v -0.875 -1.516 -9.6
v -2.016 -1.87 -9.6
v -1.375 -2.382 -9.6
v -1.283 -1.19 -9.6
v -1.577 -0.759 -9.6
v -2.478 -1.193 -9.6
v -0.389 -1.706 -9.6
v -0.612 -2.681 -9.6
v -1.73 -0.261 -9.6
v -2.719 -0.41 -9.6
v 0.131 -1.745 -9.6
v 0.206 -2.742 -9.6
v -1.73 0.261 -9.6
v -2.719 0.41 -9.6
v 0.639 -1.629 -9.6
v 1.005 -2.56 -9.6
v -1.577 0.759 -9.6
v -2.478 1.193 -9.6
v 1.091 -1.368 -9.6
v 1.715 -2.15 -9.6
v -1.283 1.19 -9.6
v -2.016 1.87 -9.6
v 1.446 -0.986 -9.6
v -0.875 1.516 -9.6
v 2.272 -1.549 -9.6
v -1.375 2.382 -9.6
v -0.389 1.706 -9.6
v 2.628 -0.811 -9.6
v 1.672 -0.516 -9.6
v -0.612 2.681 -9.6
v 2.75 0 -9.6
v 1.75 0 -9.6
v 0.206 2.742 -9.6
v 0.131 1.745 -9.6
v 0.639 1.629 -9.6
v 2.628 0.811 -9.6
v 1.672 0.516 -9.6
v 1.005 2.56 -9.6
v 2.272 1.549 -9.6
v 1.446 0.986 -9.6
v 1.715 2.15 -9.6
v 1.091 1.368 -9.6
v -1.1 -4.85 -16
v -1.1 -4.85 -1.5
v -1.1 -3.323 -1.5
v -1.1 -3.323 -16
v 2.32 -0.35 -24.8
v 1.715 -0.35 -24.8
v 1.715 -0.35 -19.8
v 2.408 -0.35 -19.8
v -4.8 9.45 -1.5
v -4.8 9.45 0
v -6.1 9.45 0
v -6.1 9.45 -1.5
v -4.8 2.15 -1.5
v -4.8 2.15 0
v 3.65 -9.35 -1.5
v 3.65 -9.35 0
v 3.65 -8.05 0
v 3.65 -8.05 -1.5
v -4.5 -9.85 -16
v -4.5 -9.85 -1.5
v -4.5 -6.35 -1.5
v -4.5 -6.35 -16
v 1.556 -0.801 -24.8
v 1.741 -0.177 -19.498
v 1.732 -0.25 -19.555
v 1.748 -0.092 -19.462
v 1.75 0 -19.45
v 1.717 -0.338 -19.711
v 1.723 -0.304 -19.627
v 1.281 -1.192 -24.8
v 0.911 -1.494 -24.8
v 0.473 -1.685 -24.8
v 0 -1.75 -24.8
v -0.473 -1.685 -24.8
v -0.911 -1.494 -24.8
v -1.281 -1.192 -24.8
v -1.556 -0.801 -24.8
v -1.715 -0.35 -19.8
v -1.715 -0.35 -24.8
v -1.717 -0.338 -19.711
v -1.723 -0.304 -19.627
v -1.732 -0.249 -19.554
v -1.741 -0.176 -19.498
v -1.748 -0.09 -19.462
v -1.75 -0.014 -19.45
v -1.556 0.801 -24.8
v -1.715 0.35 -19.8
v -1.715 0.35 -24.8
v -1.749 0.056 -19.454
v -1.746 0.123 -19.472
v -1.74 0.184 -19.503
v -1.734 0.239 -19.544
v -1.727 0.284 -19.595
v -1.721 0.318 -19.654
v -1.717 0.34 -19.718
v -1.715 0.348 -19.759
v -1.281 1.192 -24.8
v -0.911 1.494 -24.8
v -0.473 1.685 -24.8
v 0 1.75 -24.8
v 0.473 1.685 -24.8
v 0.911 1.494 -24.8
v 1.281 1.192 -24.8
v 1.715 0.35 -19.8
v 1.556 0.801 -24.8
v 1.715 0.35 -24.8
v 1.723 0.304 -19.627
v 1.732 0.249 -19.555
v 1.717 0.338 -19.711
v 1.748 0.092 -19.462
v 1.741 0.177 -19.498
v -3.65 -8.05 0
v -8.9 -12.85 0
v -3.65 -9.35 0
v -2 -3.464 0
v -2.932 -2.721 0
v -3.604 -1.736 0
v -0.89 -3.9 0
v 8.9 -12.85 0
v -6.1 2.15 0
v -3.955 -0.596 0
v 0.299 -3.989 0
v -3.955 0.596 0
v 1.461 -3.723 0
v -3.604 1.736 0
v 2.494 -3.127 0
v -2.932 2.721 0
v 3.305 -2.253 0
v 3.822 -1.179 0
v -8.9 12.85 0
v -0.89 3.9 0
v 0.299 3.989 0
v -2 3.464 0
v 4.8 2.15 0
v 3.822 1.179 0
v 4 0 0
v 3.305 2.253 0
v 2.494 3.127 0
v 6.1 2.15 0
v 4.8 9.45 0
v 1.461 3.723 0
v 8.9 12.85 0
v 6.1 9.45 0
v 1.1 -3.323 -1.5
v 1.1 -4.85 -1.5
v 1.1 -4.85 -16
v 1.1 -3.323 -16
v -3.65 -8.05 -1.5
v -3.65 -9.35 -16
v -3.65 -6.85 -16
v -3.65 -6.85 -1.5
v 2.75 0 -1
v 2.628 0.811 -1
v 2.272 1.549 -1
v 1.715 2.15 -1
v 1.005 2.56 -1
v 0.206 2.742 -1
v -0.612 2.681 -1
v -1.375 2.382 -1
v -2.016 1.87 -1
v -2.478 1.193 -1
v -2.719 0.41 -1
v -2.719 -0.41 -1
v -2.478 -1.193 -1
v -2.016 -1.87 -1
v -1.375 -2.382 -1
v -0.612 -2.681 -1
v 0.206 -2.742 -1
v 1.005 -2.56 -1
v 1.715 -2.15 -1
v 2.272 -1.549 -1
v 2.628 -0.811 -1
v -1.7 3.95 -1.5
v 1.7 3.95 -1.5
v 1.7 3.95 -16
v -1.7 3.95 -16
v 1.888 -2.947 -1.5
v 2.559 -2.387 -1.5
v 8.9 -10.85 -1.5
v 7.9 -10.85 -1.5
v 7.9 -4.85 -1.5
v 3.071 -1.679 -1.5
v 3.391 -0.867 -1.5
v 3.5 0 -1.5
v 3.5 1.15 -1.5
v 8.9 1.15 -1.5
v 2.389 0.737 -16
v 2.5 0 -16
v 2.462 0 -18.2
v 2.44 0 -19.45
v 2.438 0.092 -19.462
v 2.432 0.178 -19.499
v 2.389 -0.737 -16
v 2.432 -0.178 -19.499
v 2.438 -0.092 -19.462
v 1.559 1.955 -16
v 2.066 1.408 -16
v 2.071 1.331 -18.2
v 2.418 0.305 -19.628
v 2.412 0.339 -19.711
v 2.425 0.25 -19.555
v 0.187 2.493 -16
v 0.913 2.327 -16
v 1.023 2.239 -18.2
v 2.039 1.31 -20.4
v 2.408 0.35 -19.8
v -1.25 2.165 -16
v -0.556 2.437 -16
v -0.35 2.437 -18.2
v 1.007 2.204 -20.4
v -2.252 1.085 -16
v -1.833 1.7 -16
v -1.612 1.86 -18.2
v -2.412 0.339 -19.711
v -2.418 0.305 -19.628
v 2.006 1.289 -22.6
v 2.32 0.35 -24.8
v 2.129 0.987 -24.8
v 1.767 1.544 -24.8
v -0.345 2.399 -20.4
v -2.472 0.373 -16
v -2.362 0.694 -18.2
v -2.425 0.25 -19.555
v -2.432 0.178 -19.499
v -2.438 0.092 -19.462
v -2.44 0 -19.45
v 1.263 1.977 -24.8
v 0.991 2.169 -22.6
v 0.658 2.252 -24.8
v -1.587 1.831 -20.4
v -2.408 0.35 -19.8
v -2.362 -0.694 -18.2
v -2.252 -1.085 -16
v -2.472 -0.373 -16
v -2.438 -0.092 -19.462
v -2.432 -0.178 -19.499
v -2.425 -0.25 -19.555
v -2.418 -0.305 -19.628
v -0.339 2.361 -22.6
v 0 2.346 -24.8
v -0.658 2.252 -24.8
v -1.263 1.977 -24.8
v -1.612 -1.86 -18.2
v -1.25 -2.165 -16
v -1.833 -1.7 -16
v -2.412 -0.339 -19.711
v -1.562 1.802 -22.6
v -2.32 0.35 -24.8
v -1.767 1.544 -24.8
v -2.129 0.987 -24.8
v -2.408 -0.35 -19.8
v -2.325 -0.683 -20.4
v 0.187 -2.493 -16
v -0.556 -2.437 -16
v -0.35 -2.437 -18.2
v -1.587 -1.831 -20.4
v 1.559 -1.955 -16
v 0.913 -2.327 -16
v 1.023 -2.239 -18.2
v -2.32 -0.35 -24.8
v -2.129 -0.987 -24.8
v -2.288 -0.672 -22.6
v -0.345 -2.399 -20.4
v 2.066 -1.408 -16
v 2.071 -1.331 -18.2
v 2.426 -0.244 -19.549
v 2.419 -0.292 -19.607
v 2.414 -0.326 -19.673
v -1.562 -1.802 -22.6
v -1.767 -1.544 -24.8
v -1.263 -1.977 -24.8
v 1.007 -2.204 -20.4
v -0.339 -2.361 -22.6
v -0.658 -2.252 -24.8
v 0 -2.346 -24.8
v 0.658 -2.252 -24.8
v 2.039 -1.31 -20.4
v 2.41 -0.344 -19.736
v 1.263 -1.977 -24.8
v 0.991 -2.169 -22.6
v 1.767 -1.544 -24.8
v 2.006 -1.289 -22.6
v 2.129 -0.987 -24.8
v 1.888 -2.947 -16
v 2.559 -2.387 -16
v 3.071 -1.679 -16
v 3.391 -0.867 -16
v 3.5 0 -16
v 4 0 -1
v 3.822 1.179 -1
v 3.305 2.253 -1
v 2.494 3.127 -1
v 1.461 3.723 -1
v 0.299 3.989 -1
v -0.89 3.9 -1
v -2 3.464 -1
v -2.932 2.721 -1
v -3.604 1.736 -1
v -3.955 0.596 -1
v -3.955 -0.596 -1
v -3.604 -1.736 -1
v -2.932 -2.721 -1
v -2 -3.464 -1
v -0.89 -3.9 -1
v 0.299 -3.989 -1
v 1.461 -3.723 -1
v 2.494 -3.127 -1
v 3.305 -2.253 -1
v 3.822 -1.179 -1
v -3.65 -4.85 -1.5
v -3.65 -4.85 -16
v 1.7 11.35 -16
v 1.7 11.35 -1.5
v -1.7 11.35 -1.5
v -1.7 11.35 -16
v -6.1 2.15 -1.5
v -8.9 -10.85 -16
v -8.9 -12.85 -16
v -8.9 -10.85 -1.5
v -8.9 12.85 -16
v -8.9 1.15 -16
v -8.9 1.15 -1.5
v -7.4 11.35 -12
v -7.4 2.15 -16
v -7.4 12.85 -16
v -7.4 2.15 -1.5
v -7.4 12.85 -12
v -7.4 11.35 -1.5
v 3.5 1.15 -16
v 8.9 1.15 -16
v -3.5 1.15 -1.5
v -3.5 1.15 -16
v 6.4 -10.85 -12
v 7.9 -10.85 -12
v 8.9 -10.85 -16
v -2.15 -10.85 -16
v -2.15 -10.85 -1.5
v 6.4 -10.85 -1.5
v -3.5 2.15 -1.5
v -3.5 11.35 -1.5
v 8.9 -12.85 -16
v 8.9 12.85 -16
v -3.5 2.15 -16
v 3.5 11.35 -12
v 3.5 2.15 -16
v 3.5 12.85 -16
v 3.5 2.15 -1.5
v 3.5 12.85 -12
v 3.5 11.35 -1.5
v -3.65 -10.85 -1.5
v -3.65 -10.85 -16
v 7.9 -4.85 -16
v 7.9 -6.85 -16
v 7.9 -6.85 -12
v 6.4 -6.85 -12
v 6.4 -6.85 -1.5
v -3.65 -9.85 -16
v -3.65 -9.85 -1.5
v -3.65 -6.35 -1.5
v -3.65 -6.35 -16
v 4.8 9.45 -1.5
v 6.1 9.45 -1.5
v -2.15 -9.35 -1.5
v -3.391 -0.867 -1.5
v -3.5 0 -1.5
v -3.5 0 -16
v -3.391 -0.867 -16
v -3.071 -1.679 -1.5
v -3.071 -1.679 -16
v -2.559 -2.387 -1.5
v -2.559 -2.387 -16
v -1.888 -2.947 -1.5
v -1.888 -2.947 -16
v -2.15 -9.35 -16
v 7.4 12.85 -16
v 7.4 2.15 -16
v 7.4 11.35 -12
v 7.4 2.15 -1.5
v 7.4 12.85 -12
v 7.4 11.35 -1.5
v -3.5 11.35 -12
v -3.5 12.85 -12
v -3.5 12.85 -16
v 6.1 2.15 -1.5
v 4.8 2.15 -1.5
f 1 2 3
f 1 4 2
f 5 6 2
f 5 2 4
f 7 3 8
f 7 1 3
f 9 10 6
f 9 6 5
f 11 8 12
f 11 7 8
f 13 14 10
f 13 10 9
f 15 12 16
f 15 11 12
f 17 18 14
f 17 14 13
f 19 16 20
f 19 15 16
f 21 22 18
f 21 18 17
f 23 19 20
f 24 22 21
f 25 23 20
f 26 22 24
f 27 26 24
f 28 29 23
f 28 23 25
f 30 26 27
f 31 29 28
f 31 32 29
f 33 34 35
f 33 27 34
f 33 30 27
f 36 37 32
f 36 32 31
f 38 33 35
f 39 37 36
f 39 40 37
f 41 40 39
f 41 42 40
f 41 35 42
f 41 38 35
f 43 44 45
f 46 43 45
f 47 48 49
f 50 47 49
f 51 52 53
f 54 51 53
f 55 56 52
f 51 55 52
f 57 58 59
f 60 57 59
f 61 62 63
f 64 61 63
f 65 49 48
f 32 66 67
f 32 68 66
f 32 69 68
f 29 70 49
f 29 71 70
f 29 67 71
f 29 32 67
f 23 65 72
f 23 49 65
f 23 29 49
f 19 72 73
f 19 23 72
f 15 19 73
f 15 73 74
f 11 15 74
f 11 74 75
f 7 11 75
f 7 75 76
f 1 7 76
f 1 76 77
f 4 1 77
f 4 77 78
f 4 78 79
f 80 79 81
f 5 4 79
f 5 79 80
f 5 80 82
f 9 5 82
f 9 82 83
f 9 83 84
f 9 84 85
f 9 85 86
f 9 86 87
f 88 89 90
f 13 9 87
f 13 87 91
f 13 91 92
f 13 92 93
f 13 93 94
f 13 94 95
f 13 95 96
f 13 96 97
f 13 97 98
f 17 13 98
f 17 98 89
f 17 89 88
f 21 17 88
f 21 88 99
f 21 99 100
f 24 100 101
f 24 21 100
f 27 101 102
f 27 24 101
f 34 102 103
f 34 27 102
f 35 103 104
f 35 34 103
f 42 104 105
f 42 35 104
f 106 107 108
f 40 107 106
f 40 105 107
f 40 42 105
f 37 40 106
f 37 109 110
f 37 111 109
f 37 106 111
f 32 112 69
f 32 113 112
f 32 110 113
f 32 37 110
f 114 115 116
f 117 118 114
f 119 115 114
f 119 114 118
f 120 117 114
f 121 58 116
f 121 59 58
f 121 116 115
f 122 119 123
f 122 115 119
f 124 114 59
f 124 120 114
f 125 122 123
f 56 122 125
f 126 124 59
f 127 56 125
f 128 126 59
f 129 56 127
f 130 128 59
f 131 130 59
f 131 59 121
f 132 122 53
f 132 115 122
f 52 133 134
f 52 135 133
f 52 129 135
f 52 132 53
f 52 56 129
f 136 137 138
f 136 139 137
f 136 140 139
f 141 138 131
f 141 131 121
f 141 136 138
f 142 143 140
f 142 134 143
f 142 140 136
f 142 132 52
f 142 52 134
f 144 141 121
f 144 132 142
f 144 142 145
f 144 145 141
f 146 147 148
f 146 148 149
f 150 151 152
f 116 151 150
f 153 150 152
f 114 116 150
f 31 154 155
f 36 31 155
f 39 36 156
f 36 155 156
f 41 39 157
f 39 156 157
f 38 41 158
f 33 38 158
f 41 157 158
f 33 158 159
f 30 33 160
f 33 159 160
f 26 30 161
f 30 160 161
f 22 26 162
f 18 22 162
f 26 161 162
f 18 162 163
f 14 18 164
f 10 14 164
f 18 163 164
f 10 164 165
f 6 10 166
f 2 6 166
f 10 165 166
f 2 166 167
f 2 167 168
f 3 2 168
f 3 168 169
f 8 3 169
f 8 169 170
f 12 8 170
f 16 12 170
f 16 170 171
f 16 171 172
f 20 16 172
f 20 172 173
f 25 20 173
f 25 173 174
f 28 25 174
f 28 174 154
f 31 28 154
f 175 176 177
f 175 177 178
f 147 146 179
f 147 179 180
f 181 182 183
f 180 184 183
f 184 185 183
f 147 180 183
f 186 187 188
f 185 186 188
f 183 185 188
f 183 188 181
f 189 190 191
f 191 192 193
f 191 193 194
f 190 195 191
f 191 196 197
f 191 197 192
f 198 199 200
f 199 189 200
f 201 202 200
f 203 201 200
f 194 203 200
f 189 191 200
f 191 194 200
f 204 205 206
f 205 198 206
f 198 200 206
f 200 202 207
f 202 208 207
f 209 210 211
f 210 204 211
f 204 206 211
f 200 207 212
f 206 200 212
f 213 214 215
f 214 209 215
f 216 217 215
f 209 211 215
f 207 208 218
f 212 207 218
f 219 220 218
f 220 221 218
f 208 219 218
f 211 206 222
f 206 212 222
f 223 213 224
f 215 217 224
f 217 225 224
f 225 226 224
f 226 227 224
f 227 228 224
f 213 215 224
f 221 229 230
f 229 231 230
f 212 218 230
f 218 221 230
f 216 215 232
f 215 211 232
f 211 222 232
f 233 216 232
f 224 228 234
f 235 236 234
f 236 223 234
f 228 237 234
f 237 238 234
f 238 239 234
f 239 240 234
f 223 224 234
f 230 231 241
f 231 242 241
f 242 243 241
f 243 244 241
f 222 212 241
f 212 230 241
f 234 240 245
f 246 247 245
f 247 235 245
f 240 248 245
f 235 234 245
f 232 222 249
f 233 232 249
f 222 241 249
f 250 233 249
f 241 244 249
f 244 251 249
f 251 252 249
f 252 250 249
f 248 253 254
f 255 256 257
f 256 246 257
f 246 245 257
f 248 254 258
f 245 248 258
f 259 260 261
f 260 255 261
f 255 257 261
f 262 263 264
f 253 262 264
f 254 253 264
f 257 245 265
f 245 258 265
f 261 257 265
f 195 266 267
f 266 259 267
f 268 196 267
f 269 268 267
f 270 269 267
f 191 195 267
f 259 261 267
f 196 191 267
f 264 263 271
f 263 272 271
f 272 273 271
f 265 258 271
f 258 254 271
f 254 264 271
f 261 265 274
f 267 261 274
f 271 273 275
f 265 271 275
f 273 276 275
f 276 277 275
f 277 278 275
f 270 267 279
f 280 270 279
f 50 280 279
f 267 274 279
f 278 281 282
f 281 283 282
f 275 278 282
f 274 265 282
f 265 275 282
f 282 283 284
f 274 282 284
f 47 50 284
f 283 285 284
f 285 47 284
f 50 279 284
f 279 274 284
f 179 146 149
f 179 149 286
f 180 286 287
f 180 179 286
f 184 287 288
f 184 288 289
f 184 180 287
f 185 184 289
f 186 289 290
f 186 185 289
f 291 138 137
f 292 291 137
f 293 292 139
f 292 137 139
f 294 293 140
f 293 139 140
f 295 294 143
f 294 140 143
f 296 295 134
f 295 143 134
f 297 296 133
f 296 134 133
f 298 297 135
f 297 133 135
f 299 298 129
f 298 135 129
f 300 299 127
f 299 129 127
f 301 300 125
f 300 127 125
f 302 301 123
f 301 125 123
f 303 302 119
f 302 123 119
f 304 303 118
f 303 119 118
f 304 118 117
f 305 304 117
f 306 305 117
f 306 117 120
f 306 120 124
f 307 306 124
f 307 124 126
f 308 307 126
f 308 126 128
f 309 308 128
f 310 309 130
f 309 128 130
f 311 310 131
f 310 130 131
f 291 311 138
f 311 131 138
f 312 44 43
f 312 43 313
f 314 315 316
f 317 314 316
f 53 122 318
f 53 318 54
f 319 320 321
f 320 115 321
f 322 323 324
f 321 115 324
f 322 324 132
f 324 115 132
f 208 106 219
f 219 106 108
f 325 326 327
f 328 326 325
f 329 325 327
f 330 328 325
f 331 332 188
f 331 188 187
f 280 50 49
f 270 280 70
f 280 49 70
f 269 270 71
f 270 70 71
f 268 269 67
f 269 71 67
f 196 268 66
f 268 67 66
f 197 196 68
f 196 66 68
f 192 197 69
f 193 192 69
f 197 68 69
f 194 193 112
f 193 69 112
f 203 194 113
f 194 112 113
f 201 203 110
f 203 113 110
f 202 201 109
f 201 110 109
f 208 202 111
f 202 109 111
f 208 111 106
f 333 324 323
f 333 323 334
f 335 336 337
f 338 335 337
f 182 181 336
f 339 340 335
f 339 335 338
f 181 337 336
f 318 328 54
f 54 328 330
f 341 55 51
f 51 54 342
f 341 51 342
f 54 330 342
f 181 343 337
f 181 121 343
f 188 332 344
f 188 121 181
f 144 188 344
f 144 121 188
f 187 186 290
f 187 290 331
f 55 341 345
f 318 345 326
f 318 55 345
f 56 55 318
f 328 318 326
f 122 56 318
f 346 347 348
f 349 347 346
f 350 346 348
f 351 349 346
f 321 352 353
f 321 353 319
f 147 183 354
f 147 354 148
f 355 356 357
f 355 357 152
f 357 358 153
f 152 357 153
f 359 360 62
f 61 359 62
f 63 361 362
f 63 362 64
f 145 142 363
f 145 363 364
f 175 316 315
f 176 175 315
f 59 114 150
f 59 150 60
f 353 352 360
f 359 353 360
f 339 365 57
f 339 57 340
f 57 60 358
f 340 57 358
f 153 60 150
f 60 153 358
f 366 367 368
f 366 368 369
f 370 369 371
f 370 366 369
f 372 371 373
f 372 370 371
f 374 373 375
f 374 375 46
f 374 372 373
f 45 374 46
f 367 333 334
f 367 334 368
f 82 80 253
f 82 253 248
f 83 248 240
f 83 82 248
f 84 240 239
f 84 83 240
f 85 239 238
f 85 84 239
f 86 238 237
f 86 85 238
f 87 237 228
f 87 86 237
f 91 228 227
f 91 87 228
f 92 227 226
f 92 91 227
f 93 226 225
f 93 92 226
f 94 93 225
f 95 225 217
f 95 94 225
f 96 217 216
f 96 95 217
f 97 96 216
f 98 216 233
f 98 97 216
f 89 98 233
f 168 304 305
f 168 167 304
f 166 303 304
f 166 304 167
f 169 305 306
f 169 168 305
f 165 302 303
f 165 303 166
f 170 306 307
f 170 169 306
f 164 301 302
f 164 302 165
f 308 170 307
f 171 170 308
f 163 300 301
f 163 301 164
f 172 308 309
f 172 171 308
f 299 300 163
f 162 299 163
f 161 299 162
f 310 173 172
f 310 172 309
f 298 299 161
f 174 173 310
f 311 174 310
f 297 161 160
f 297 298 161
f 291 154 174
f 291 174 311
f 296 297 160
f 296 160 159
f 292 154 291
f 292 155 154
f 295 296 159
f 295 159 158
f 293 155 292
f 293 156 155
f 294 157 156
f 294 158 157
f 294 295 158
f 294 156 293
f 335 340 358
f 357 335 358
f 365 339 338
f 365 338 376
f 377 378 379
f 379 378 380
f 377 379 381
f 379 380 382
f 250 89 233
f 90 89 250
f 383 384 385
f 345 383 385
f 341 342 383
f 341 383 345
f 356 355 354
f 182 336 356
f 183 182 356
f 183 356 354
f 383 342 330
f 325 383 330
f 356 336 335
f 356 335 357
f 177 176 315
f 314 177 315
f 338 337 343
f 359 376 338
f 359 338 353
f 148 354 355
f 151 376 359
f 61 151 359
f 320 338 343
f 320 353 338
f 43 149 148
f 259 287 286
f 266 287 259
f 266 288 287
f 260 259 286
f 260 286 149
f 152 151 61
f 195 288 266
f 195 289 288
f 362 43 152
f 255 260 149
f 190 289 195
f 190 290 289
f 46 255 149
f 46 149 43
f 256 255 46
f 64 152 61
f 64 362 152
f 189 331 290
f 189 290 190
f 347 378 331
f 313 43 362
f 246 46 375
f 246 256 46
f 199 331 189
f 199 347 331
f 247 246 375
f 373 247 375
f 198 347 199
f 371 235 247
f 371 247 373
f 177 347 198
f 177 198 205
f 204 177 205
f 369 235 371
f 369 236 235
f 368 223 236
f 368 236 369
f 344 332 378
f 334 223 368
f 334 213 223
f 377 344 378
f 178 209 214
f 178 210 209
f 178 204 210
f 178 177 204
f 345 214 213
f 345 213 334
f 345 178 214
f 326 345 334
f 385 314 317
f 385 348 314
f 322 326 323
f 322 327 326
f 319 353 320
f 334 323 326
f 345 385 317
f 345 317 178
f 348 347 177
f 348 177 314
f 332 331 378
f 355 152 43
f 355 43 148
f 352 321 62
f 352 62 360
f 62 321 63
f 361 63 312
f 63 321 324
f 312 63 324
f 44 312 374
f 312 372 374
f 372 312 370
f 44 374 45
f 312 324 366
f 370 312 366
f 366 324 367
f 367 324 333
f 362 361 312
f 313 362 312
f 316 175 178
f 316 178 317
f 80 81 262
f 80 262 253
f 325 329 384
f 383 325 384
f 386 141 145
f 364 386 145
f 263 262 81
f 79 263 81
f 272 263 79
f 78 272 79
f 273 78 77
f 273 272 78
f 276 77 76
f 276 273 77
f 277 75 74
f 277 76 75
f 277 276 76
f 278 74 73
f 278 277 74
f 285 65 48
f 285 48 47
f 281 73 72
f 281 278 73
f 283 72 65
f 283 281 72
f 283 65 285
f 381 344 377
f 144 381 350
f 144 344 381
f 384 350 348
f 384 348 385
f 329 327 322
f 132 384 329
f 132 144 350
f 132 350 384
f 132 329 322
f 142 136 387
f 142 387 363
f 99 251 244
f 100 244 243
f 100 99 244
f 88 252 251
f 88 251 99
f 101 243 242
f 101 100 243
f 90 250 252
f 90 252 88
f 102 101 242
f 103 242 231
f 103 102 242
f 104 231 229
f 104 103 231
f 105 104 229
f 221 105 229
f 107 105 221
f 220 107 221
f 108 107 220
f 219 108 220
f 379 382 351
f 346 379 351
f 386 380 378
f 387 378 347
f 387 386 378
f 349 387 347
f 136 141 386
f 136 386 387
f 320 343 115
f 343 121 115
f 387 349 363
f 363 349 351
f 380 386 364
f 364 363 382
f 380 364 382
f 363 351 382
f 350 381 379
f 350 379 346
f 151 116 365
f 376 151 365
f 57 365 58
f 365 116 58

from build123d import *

# Parameters (mm, degrees)
BASES_W                              = 17.8
BASES_H                              = 25.7
BASE_DEPTH                           = 1.5
NEUTRALS_W                           = 1.3
NEUTRALS_H                           = 7.3
NEUTRAL_DEPTH                        = 1.6
FASTENERACCESSS_R                    = 4
FASTENER_ACCESS_DEPTH                = 1
GROUNDS_W                            = 7.3
GROUNDS_H                            = 1.3
GROUND_DEPTH                         = 1.6
BASETOPS_W                           = 17.8
BASETOPS_H                           = 1.5
BASE_TOP_DEPTH                       = 14.5
BASERIGHTWALLS_W                     = 1.5
BASERIGHTWALLS_H                     = 10.2
BASE_RIGHT_WALL_DEPTH                = 14.5
CONNECTORWALLS_W                     = 1.8
CONNECTORWALLS_H                     = 10.2
CONNECTOR_WALL_DEPTH                 = 14.5
CONNECTOR_LOCATE_REACH               = 33.555
CONNECTORLOCATES_W                   = 3.9
CONNECTORLOCATES_H                   = 4
BASEBOTTOMS_W                        = 17.8
BASEBOTTOMS_H                        = 2
BASE_BOTTOM_DEPTH                    = 14.5
FASTENERACCESSHOLEEXTENDS_R          = 2.75
FASTENER_ACCESS_HOLE_EXTEND_DEPTH    = 22.664083179
FASTENER_HOLDING_BODY_DEPTH          = 14.5
FASTENERHOLDINGTOPBORES_R            = 2.75
FASTENER_HOLDING_TOP_BORE_DEPTH      = 8.1
FASTENERHOLDINGBORES_R               = 1.75
FASTENER_HOLDING_BORE_DEPTH          = 19.343731899
ELECTRICALCONNECTIONBASES_W          = 3.9
ELECTRICALCONNECTIONBASES_H          = 1
ELECTRICAL_CONNECTION_BASE_DEPTH     = 14.5
CONNECTIONS_MIDWALL_JOINT_DEPTH      = 14.5
FASTENERHOLDINGEXTENDEDBODYS_R       = 2.5
FASTENERHOLDINGEXTENDEDBODYS_R_2     = 1.75
FASTENER_HOLDING_EXTENDED_BODY_DEPTH = 8.8
FHEB_SLOT_REACH                      = 31.315
FHEB_SLOT_DIRECTION_2_REACH          = 31.315
MIDWALLENDS_W                        = 2.2
MIDWALLENDS_H                        = 1.527350455
MID_WALL_END_DEPTH                   = 14.5
GROUNDWALLS_W                        = 1.5
GROUNDWALLS_H                        = 6
GROUND_WALL_DEPTH                    = 14.5
GROUNDEXTENDEDWALLSS_W               = 10.05
GROUNDEXTENDEDWALLSS_H               = 2
GROUNDEXTENDEDWALLSS_W_2             = 1.5
GROUNDEXTENDEDWALLSS_H_2             = 1.5
GROUND_EXTENDED_WALLS_DEPTH          = 14.5
GROUNDENDWALLS_W                     = 0.85
GROUNDENDWALLS_H                     = 3.5
GROUND_END_WALL_DEPTH                = 14.5
GROUND_CONNECTOR_LOCATE_REACH        = 34.595
GROUNDCONNECTORLOCATES_W             = 4
GROUNDCONNECTORLOCATES_H             = 4


# Read off the part's stored shape, not the designer's step: FHEB DRAFT
with BuildPart() as part:
    # BaseS → BASE (new body)
    with BuildSketch(Plane.XY):
        Rectangle(BASES_W, BASES_H)
    extrude(amount=-BASE_DEPTH)

    # NeutralS → NEUTRAL (cut)
    with BuildSketch(Plane.XY):
        with Locations((5.45, 5.8)):
            Rectangle(NEUTRALS_W, NEUTRALS_H)
    neutral = extrude(amount=-NEUTRAL_DEPTH, mode=Mode.SUBTRACT)

    # LINE HM: NEUTRAL across plane
    add(neutral.mirror(Plane(origin=(0, 0, 0), x_dir=(0, 0, 1), z_dir=(1, 0, 0))), mode=Mode.SUBTRACT)

    # FastenerAccessS → FASTENER ACCESS (cut)
    with BuildSketch(Plane.XY):
        Circle(FASTENERACCESSS_R)
    extrude(amount=-FASTENER_ACCESS_DEPTH, mode=Mode.SUBTRACT)

    # GroundS → GROUND (cut)
    with BuildSketch(Plane.XY):
        with Locations((0, -8.7)):
            Rectangle(GROUNDS_W, GROUNDS_H)
    extrude(amount=-GROUND_DEPTH, mode=Mode.SUBTRACT)

    # BaseTopS → BASE TOP (add)
    with BuildSketch(Plane(origin=(0, 0, -1.5), x_dir=(-1, 0, 0), z_dir=(0, 0, -1))):
        with Locations((0, 12.1)):
            Rectangle(BASETOPS_W, BASETOPS_H)
    extrude(amount=BASE_TOP_DEPTH)

    # BaseRightWallS → BASE RIGHT WALL (add)
    with BuildSketch(Plane(origin=(0, 0, -1.5), x_dir=(-1, 0, 0), z_dir=(0, 0, -1))):
        with Locations((-8.15, 6.25)):
            Rectangle(BASERIGHTWALLS_W, BASERIGHTWALLS_H)
    base_right_wall = extrude(amount=BASE_RIGHT_WALL_DEPTH)

    # ConnectorWallS → CONNECTOR WALL (add)
    with BuildSketch(Plane(origin=(0, 0, -1.5), x_dir=(-1, 0, 0), z_dir=(0, 0, -1))):
        with Locations((-2.6, 6.25)):
            Rectangle(CONNECTORWALLS_W, CONNECTORWALLS_H)
    connector_wall = extrude(amount=CONNECTOR_WALL_DEPTH)

    # ConnectorLocateS → CONNECTOR LOCATE (cut, up to next)
    with BuildSketch(Plane(origin=(0, 12.85, 0), x_dir=(-1, 0, 0), z_dir=(0, 1, 0)), mode=Mode.PRIVATE) as connector_locate_sk1:
        with Locations((-5.45, -14)):
            Rectangle(CONNECTORLOCATES_W, CONNECTORLOCATES_H)
    connector_locate_tool1 = extrude(connector_locate_sk1.sketch, amount=-CONNECTOR_LOCATE_REACH, mode=Mode.PRIVATE) & part.part
    connector_locate = connector_locate_tool1.solids().sort_by_distance((5.45, 12.85, -14))[0]
    add(connector_locate, mode=Mode.SUBTRACT)

    # CW CL HM: BASE RIGHT WALL, CONNECTOR WALL, CONNECTOR LOCATE across plane
    add(base_right_wall.mirror(Plane(origin=(0, 0, 0), x_dir=(0, 0, 1), z_dir=(1, 0, 0))))
    add(connector_wall.mirror(Plane(origin=(0, 0, 0), x_dir=(0, 0, 1), z_dir=(1, 0, 0))))
    add(connector_locate.mirror(Plane(origin=(0, 0, 0), x_dir=(0, 0, 1), z_dir=(1, 0, 0))), mode=Mode.SUBTRACT)

    # BaseBottomS → BASE BOTTOM (add)
    with BuildSketch(Plane(origin=(0, 0, -1.5), x_dir=(-1, 0, 0), z_dir=(0, 0, -1))):
        with Locations((0, -11.85)):
            Rectangle(BASEBOTTOMS_W, BASEBOTTOMS_H)
    extrude(amount=BASE_BOTTOM_DEPTH)

    # FastenerAccessHoleExtendS → FASTENER ACCESS HOLE EXTEND (cut, through all)
    with BuildSketch(Plane.XY.offset(-1)):
        Circle(FASTENERACCESSHOLEEXTENDS_R)
    extrude(amount=-FASTENER_ACCESS_HOLE_EXTEND_DEPTH, mode=Mode.SUBTRACT)

    # FastenerHoldingBodyS → FASTENER HOLDING BODY (add)
    with BuildSketch(Plane(origin=(0, 0, -1.5), x_dir=(-1, 0, 0), z_dir=(0, 0, -1))):
        with BuildLine():
            Line((-3.5, 0), (-3.5, 1.15))
            Line((-3.5, 1.15), (-3.305676935, 1.15))
            ThreePointArc((-3.305676935, 1.15), (0, 3.5), (3.305676935, 1.15))
            Line((3.305676935, 1.15), (3.5, 1.15))
            Line((3.5, 1.15), (3.5, 0))
            ThreePointArc((3.5, 0), (0, -3.5), (-3.5, 0))
        make_face()
    extrude(amount=FASTENER_HOLDING_BODY_DEPTH)

    # FastenerHoldingTopBoreS → FASTENER HOLDING TOP BORE (cut)
    with BuildSketch(Plane.XY.offset(-1.5)):
        Circle(FASTENERHOLDINGTOPBORES_R)
    extrude(amount=-FASTENER_HOLDING_TOP_BORE_DEPTH, mode=Mode.SUBTRACT)

    # FastenerHoldingBoreS → FASTENER HOLDING BORE (cut, through all)
    with BuildSketch(Plane.XY.offset(-9.6)):
        Circle(FASTENERHOLDINGBORES_R)
    extrude(amount=-FASTENER_HOLDING_BORE_DEPTH, mode=Mode.SUBTRACT)

    # ElectricalConnectionBaseS → ELECTRICAL CONNECTION BASE (add)
    with BuildSketch(Plane(origin=(0, 0, -1.5), x_dir=(-1, 0, 0), z_dir=(0, 0, -1))):
        with Locations((-5.45, 1.65)):
            Rectangle(ELECTRICALCONNECTIONBASES_W, ELECTRICALCONNECTIONBASES_H)
        with Locations((5.45, 1.65)):
            Rectangle(ELECTRICALCONNECTIONBASES_W, ELECTRICALCONNECTIONBASES_H)
    extrude(amount=ELECTRICAL_CONNECTION_BASE_DEPTH)

    # ConnectionsMidwallJointS → CONNECTIONS MIDWALL JOINT (add)
    with BuildSketch(Plane(origin=(0, 0, -1.5), x_dir=(-1, 0, 0), z_dir=(0, 0, -1))):
        with BuildLine():
            Line((-1.7, 3.95), (1.7, 3.95))
            Line((1.7, 3.95), (1.7, 3.059411708))
            ThreePointArc((1.7, 3.059411708), (0, 3.5), (-1.7, 3.059411708))
            Line((-1.7, 3.059411708), (-1.7, 3.95))
        make_face()
    extrude(amount=CONNECTIONS_MIDWALL_JOINT_DEPTH)

    # FastenerHoldingExtendedBodyS → FASTENER HOLDING EXTENDED BODY (add)
    with BuildSketch(Plane(origin=(0, 0, -16), x_dir=(-1, 0, 0), z_dir=(0, 0, -1))):
        with Locations(Location((0, 0, 0), (0, 0, 180))):
            Circle(FASTENERHOLDINGEXTENDEDBODYS_R)
        with Locations(Location((0, 0, 0), (0, 0, 180))):
            Circle(FASTENERHOLDINGEXTENDEDBODYS_R_2, mode=Mode.SUBTRACT)
    extrude(amount=FASTENER_HOLDING_EXTENDED_BODY_DEPTH)

    # FHEBSlotS → FHEB SLOT (cut, up to next)
    with BuildSketch(Plane(origin=(0, 0, 0), x_dir=(0, 0, -1), z_dir=(1, 0, 0)), mode=Mode.PRIVATE) as fheb_slot_sk1:
        with BuildLine():
            Line((24.8, -0.35), (19.8, -0.35))
            ThreePointArc((19.8, -0.35), (19.45, 0), (19.8, 0.35))
            Line((19.8, 0.35), (24.8, 0.35))
            Line((24.8, 0.35), (24.8, -0.35))
        make_face()
    fheb_slot_tool1 = extrude(fheb_slot_sk1.sketch, amount=-FHEB_SLOT_REACH, mode=Mode.PRIVATE) & part.part
    add(fheb_slot_tool1.solids().sort_by_distance((0, 0, -22.161977))[0], mode=Mode.SUBTRACT)

    # FHEBSlotS → FHEB SLOT direction 2 (cut, up to next)
    with BuildSketch(Plane(origin=(0, 0, 0), x_dir=(0, 0, -1), z_dir=(1, 0, 0)), mode=Mode.PRIVATE) as fheb_slot_direction_2_sk1:
        with BuildLine():
            Line((24.8, -0.35), (19.8, -0.35))
            ThreePointArc((19.8, -0.35), (19.45, 0), (19.8, 0.35))
            Line((19.8, 0.35), (24.8, 0.35))
            Line((24.8, 0.35), (24.8, -0.35))
        make_face()
    fheb_slot_direction_2_tool1 = extrude(fheb_slot_direction_2_sk1.sketch, amount=FHEB_SLOT_DIRECTION_2_REACH, mode=Mode.PRIVATE) & part.part
    add(fheb_slot_direction_2_tool1.solids().sort_by_distance((0, 0, -22.161977))[0], mode=Mode.SUBTRACT)

    # MidWallEndS → MID WALL END (add)
    with BuildSketch(Plane(origin=(0, 0, -1.5), x_dir=(-1, 0, 0), z_dir=(0, 0, -1))):
        with Locations((0, -4.086324773)):
            Rectangle(MIDWALLENDS_W, MIDWALLENDS_H)
    extrude(amount=MID_WALL_END_DEPTH)

    # GroundWallS → GROUND WALL (add)
    with BuildSketch(Plane(origin=(0, 0, -1.5), x_dir=(-1, 0, 0), z_dir=(0, 0, -1))):
        with Locations((-7.15, -7.85)):
            Rectangle(GROUNDWALLS_W, GROUNDWALLS_H)
    extrude(amount=GROUND_WALL_DEPTH)

    # GroundExtendedWallsS → GROUND EXTENDED WALLS (add)
    with BuildSketch(Plane(origin=(0, 0, -1.5), x_dir=(-1, 0, 0), z_dir=(0, 0, -1))):
        with Locations((-1.375, -5.85)):
            Rectangle(GROUNDEXTENDEDWALLSS_W, GROUNDEXTENDEDWALLSS_H)
        with Locations((2.9, -10.1)):
            Rectangle(GROUNDEXTENDEDWALLSS_W_2, GROUNDEXTENDEDWALLSS_H_2)
    extrude(amount=GROUND_EXTENDED_WALLS_DEPTH)

    # GroundEndWallS → GROUND END WALL (add)
    with BuildSketch(Plane(origin=(0, 0, -1.5), x_dir=(-1, 0, 0), z_dir=(0, 0, -1))):
        with Locations((4.075, -8.1)):
            Rectangle(GROUNDENDWALLS_W, GROUNDENDWALLS_H)
    extrude(amount=GROUND_END_WALL_DEPTH)

    # FHEB DRAFT outline → FHEB DRAFT (revolve, cut)
    with BuildSketch(Plane.XZ):
        Polygon((2.5, -16), (2.346395429, -24.8), (2.5, -24.8), align=None)
    revolve(axis=Axis((0, 0, 0), (0, 0, 1)), mode=Mode.SUBTRACT)

    # GroundConnectorLocateS → GROUND CONNECTOR LOCATE (cut, up to next)
    with BuildSketch(Plane(origin=(7.9, 0, 0), x_dir=(0, 0, -1), z_dir=(1, 0, 0)), mode=Mode.PRIVATE) as ground_connector_locate_sk1:
        with Locations((14, -8.85)):
            Rectangle(GROUNDCONNECTORLOCATES_W, GROUNDCONNECTORLOCATES_H)
    ground_connector_locate_tool1 = extrude(ground_connector_locate_sk1.sketch, amount=-GROUND_CONNECTOR_LOCATE_REACH, mode=Mode.PRIVATE) & part.part
    add(ground_connector_locate_tool1.solids().sort_by_distance((7.9, -8.85, -14))[0], mode=Mode.SUBTRACT)


solid = part.part
